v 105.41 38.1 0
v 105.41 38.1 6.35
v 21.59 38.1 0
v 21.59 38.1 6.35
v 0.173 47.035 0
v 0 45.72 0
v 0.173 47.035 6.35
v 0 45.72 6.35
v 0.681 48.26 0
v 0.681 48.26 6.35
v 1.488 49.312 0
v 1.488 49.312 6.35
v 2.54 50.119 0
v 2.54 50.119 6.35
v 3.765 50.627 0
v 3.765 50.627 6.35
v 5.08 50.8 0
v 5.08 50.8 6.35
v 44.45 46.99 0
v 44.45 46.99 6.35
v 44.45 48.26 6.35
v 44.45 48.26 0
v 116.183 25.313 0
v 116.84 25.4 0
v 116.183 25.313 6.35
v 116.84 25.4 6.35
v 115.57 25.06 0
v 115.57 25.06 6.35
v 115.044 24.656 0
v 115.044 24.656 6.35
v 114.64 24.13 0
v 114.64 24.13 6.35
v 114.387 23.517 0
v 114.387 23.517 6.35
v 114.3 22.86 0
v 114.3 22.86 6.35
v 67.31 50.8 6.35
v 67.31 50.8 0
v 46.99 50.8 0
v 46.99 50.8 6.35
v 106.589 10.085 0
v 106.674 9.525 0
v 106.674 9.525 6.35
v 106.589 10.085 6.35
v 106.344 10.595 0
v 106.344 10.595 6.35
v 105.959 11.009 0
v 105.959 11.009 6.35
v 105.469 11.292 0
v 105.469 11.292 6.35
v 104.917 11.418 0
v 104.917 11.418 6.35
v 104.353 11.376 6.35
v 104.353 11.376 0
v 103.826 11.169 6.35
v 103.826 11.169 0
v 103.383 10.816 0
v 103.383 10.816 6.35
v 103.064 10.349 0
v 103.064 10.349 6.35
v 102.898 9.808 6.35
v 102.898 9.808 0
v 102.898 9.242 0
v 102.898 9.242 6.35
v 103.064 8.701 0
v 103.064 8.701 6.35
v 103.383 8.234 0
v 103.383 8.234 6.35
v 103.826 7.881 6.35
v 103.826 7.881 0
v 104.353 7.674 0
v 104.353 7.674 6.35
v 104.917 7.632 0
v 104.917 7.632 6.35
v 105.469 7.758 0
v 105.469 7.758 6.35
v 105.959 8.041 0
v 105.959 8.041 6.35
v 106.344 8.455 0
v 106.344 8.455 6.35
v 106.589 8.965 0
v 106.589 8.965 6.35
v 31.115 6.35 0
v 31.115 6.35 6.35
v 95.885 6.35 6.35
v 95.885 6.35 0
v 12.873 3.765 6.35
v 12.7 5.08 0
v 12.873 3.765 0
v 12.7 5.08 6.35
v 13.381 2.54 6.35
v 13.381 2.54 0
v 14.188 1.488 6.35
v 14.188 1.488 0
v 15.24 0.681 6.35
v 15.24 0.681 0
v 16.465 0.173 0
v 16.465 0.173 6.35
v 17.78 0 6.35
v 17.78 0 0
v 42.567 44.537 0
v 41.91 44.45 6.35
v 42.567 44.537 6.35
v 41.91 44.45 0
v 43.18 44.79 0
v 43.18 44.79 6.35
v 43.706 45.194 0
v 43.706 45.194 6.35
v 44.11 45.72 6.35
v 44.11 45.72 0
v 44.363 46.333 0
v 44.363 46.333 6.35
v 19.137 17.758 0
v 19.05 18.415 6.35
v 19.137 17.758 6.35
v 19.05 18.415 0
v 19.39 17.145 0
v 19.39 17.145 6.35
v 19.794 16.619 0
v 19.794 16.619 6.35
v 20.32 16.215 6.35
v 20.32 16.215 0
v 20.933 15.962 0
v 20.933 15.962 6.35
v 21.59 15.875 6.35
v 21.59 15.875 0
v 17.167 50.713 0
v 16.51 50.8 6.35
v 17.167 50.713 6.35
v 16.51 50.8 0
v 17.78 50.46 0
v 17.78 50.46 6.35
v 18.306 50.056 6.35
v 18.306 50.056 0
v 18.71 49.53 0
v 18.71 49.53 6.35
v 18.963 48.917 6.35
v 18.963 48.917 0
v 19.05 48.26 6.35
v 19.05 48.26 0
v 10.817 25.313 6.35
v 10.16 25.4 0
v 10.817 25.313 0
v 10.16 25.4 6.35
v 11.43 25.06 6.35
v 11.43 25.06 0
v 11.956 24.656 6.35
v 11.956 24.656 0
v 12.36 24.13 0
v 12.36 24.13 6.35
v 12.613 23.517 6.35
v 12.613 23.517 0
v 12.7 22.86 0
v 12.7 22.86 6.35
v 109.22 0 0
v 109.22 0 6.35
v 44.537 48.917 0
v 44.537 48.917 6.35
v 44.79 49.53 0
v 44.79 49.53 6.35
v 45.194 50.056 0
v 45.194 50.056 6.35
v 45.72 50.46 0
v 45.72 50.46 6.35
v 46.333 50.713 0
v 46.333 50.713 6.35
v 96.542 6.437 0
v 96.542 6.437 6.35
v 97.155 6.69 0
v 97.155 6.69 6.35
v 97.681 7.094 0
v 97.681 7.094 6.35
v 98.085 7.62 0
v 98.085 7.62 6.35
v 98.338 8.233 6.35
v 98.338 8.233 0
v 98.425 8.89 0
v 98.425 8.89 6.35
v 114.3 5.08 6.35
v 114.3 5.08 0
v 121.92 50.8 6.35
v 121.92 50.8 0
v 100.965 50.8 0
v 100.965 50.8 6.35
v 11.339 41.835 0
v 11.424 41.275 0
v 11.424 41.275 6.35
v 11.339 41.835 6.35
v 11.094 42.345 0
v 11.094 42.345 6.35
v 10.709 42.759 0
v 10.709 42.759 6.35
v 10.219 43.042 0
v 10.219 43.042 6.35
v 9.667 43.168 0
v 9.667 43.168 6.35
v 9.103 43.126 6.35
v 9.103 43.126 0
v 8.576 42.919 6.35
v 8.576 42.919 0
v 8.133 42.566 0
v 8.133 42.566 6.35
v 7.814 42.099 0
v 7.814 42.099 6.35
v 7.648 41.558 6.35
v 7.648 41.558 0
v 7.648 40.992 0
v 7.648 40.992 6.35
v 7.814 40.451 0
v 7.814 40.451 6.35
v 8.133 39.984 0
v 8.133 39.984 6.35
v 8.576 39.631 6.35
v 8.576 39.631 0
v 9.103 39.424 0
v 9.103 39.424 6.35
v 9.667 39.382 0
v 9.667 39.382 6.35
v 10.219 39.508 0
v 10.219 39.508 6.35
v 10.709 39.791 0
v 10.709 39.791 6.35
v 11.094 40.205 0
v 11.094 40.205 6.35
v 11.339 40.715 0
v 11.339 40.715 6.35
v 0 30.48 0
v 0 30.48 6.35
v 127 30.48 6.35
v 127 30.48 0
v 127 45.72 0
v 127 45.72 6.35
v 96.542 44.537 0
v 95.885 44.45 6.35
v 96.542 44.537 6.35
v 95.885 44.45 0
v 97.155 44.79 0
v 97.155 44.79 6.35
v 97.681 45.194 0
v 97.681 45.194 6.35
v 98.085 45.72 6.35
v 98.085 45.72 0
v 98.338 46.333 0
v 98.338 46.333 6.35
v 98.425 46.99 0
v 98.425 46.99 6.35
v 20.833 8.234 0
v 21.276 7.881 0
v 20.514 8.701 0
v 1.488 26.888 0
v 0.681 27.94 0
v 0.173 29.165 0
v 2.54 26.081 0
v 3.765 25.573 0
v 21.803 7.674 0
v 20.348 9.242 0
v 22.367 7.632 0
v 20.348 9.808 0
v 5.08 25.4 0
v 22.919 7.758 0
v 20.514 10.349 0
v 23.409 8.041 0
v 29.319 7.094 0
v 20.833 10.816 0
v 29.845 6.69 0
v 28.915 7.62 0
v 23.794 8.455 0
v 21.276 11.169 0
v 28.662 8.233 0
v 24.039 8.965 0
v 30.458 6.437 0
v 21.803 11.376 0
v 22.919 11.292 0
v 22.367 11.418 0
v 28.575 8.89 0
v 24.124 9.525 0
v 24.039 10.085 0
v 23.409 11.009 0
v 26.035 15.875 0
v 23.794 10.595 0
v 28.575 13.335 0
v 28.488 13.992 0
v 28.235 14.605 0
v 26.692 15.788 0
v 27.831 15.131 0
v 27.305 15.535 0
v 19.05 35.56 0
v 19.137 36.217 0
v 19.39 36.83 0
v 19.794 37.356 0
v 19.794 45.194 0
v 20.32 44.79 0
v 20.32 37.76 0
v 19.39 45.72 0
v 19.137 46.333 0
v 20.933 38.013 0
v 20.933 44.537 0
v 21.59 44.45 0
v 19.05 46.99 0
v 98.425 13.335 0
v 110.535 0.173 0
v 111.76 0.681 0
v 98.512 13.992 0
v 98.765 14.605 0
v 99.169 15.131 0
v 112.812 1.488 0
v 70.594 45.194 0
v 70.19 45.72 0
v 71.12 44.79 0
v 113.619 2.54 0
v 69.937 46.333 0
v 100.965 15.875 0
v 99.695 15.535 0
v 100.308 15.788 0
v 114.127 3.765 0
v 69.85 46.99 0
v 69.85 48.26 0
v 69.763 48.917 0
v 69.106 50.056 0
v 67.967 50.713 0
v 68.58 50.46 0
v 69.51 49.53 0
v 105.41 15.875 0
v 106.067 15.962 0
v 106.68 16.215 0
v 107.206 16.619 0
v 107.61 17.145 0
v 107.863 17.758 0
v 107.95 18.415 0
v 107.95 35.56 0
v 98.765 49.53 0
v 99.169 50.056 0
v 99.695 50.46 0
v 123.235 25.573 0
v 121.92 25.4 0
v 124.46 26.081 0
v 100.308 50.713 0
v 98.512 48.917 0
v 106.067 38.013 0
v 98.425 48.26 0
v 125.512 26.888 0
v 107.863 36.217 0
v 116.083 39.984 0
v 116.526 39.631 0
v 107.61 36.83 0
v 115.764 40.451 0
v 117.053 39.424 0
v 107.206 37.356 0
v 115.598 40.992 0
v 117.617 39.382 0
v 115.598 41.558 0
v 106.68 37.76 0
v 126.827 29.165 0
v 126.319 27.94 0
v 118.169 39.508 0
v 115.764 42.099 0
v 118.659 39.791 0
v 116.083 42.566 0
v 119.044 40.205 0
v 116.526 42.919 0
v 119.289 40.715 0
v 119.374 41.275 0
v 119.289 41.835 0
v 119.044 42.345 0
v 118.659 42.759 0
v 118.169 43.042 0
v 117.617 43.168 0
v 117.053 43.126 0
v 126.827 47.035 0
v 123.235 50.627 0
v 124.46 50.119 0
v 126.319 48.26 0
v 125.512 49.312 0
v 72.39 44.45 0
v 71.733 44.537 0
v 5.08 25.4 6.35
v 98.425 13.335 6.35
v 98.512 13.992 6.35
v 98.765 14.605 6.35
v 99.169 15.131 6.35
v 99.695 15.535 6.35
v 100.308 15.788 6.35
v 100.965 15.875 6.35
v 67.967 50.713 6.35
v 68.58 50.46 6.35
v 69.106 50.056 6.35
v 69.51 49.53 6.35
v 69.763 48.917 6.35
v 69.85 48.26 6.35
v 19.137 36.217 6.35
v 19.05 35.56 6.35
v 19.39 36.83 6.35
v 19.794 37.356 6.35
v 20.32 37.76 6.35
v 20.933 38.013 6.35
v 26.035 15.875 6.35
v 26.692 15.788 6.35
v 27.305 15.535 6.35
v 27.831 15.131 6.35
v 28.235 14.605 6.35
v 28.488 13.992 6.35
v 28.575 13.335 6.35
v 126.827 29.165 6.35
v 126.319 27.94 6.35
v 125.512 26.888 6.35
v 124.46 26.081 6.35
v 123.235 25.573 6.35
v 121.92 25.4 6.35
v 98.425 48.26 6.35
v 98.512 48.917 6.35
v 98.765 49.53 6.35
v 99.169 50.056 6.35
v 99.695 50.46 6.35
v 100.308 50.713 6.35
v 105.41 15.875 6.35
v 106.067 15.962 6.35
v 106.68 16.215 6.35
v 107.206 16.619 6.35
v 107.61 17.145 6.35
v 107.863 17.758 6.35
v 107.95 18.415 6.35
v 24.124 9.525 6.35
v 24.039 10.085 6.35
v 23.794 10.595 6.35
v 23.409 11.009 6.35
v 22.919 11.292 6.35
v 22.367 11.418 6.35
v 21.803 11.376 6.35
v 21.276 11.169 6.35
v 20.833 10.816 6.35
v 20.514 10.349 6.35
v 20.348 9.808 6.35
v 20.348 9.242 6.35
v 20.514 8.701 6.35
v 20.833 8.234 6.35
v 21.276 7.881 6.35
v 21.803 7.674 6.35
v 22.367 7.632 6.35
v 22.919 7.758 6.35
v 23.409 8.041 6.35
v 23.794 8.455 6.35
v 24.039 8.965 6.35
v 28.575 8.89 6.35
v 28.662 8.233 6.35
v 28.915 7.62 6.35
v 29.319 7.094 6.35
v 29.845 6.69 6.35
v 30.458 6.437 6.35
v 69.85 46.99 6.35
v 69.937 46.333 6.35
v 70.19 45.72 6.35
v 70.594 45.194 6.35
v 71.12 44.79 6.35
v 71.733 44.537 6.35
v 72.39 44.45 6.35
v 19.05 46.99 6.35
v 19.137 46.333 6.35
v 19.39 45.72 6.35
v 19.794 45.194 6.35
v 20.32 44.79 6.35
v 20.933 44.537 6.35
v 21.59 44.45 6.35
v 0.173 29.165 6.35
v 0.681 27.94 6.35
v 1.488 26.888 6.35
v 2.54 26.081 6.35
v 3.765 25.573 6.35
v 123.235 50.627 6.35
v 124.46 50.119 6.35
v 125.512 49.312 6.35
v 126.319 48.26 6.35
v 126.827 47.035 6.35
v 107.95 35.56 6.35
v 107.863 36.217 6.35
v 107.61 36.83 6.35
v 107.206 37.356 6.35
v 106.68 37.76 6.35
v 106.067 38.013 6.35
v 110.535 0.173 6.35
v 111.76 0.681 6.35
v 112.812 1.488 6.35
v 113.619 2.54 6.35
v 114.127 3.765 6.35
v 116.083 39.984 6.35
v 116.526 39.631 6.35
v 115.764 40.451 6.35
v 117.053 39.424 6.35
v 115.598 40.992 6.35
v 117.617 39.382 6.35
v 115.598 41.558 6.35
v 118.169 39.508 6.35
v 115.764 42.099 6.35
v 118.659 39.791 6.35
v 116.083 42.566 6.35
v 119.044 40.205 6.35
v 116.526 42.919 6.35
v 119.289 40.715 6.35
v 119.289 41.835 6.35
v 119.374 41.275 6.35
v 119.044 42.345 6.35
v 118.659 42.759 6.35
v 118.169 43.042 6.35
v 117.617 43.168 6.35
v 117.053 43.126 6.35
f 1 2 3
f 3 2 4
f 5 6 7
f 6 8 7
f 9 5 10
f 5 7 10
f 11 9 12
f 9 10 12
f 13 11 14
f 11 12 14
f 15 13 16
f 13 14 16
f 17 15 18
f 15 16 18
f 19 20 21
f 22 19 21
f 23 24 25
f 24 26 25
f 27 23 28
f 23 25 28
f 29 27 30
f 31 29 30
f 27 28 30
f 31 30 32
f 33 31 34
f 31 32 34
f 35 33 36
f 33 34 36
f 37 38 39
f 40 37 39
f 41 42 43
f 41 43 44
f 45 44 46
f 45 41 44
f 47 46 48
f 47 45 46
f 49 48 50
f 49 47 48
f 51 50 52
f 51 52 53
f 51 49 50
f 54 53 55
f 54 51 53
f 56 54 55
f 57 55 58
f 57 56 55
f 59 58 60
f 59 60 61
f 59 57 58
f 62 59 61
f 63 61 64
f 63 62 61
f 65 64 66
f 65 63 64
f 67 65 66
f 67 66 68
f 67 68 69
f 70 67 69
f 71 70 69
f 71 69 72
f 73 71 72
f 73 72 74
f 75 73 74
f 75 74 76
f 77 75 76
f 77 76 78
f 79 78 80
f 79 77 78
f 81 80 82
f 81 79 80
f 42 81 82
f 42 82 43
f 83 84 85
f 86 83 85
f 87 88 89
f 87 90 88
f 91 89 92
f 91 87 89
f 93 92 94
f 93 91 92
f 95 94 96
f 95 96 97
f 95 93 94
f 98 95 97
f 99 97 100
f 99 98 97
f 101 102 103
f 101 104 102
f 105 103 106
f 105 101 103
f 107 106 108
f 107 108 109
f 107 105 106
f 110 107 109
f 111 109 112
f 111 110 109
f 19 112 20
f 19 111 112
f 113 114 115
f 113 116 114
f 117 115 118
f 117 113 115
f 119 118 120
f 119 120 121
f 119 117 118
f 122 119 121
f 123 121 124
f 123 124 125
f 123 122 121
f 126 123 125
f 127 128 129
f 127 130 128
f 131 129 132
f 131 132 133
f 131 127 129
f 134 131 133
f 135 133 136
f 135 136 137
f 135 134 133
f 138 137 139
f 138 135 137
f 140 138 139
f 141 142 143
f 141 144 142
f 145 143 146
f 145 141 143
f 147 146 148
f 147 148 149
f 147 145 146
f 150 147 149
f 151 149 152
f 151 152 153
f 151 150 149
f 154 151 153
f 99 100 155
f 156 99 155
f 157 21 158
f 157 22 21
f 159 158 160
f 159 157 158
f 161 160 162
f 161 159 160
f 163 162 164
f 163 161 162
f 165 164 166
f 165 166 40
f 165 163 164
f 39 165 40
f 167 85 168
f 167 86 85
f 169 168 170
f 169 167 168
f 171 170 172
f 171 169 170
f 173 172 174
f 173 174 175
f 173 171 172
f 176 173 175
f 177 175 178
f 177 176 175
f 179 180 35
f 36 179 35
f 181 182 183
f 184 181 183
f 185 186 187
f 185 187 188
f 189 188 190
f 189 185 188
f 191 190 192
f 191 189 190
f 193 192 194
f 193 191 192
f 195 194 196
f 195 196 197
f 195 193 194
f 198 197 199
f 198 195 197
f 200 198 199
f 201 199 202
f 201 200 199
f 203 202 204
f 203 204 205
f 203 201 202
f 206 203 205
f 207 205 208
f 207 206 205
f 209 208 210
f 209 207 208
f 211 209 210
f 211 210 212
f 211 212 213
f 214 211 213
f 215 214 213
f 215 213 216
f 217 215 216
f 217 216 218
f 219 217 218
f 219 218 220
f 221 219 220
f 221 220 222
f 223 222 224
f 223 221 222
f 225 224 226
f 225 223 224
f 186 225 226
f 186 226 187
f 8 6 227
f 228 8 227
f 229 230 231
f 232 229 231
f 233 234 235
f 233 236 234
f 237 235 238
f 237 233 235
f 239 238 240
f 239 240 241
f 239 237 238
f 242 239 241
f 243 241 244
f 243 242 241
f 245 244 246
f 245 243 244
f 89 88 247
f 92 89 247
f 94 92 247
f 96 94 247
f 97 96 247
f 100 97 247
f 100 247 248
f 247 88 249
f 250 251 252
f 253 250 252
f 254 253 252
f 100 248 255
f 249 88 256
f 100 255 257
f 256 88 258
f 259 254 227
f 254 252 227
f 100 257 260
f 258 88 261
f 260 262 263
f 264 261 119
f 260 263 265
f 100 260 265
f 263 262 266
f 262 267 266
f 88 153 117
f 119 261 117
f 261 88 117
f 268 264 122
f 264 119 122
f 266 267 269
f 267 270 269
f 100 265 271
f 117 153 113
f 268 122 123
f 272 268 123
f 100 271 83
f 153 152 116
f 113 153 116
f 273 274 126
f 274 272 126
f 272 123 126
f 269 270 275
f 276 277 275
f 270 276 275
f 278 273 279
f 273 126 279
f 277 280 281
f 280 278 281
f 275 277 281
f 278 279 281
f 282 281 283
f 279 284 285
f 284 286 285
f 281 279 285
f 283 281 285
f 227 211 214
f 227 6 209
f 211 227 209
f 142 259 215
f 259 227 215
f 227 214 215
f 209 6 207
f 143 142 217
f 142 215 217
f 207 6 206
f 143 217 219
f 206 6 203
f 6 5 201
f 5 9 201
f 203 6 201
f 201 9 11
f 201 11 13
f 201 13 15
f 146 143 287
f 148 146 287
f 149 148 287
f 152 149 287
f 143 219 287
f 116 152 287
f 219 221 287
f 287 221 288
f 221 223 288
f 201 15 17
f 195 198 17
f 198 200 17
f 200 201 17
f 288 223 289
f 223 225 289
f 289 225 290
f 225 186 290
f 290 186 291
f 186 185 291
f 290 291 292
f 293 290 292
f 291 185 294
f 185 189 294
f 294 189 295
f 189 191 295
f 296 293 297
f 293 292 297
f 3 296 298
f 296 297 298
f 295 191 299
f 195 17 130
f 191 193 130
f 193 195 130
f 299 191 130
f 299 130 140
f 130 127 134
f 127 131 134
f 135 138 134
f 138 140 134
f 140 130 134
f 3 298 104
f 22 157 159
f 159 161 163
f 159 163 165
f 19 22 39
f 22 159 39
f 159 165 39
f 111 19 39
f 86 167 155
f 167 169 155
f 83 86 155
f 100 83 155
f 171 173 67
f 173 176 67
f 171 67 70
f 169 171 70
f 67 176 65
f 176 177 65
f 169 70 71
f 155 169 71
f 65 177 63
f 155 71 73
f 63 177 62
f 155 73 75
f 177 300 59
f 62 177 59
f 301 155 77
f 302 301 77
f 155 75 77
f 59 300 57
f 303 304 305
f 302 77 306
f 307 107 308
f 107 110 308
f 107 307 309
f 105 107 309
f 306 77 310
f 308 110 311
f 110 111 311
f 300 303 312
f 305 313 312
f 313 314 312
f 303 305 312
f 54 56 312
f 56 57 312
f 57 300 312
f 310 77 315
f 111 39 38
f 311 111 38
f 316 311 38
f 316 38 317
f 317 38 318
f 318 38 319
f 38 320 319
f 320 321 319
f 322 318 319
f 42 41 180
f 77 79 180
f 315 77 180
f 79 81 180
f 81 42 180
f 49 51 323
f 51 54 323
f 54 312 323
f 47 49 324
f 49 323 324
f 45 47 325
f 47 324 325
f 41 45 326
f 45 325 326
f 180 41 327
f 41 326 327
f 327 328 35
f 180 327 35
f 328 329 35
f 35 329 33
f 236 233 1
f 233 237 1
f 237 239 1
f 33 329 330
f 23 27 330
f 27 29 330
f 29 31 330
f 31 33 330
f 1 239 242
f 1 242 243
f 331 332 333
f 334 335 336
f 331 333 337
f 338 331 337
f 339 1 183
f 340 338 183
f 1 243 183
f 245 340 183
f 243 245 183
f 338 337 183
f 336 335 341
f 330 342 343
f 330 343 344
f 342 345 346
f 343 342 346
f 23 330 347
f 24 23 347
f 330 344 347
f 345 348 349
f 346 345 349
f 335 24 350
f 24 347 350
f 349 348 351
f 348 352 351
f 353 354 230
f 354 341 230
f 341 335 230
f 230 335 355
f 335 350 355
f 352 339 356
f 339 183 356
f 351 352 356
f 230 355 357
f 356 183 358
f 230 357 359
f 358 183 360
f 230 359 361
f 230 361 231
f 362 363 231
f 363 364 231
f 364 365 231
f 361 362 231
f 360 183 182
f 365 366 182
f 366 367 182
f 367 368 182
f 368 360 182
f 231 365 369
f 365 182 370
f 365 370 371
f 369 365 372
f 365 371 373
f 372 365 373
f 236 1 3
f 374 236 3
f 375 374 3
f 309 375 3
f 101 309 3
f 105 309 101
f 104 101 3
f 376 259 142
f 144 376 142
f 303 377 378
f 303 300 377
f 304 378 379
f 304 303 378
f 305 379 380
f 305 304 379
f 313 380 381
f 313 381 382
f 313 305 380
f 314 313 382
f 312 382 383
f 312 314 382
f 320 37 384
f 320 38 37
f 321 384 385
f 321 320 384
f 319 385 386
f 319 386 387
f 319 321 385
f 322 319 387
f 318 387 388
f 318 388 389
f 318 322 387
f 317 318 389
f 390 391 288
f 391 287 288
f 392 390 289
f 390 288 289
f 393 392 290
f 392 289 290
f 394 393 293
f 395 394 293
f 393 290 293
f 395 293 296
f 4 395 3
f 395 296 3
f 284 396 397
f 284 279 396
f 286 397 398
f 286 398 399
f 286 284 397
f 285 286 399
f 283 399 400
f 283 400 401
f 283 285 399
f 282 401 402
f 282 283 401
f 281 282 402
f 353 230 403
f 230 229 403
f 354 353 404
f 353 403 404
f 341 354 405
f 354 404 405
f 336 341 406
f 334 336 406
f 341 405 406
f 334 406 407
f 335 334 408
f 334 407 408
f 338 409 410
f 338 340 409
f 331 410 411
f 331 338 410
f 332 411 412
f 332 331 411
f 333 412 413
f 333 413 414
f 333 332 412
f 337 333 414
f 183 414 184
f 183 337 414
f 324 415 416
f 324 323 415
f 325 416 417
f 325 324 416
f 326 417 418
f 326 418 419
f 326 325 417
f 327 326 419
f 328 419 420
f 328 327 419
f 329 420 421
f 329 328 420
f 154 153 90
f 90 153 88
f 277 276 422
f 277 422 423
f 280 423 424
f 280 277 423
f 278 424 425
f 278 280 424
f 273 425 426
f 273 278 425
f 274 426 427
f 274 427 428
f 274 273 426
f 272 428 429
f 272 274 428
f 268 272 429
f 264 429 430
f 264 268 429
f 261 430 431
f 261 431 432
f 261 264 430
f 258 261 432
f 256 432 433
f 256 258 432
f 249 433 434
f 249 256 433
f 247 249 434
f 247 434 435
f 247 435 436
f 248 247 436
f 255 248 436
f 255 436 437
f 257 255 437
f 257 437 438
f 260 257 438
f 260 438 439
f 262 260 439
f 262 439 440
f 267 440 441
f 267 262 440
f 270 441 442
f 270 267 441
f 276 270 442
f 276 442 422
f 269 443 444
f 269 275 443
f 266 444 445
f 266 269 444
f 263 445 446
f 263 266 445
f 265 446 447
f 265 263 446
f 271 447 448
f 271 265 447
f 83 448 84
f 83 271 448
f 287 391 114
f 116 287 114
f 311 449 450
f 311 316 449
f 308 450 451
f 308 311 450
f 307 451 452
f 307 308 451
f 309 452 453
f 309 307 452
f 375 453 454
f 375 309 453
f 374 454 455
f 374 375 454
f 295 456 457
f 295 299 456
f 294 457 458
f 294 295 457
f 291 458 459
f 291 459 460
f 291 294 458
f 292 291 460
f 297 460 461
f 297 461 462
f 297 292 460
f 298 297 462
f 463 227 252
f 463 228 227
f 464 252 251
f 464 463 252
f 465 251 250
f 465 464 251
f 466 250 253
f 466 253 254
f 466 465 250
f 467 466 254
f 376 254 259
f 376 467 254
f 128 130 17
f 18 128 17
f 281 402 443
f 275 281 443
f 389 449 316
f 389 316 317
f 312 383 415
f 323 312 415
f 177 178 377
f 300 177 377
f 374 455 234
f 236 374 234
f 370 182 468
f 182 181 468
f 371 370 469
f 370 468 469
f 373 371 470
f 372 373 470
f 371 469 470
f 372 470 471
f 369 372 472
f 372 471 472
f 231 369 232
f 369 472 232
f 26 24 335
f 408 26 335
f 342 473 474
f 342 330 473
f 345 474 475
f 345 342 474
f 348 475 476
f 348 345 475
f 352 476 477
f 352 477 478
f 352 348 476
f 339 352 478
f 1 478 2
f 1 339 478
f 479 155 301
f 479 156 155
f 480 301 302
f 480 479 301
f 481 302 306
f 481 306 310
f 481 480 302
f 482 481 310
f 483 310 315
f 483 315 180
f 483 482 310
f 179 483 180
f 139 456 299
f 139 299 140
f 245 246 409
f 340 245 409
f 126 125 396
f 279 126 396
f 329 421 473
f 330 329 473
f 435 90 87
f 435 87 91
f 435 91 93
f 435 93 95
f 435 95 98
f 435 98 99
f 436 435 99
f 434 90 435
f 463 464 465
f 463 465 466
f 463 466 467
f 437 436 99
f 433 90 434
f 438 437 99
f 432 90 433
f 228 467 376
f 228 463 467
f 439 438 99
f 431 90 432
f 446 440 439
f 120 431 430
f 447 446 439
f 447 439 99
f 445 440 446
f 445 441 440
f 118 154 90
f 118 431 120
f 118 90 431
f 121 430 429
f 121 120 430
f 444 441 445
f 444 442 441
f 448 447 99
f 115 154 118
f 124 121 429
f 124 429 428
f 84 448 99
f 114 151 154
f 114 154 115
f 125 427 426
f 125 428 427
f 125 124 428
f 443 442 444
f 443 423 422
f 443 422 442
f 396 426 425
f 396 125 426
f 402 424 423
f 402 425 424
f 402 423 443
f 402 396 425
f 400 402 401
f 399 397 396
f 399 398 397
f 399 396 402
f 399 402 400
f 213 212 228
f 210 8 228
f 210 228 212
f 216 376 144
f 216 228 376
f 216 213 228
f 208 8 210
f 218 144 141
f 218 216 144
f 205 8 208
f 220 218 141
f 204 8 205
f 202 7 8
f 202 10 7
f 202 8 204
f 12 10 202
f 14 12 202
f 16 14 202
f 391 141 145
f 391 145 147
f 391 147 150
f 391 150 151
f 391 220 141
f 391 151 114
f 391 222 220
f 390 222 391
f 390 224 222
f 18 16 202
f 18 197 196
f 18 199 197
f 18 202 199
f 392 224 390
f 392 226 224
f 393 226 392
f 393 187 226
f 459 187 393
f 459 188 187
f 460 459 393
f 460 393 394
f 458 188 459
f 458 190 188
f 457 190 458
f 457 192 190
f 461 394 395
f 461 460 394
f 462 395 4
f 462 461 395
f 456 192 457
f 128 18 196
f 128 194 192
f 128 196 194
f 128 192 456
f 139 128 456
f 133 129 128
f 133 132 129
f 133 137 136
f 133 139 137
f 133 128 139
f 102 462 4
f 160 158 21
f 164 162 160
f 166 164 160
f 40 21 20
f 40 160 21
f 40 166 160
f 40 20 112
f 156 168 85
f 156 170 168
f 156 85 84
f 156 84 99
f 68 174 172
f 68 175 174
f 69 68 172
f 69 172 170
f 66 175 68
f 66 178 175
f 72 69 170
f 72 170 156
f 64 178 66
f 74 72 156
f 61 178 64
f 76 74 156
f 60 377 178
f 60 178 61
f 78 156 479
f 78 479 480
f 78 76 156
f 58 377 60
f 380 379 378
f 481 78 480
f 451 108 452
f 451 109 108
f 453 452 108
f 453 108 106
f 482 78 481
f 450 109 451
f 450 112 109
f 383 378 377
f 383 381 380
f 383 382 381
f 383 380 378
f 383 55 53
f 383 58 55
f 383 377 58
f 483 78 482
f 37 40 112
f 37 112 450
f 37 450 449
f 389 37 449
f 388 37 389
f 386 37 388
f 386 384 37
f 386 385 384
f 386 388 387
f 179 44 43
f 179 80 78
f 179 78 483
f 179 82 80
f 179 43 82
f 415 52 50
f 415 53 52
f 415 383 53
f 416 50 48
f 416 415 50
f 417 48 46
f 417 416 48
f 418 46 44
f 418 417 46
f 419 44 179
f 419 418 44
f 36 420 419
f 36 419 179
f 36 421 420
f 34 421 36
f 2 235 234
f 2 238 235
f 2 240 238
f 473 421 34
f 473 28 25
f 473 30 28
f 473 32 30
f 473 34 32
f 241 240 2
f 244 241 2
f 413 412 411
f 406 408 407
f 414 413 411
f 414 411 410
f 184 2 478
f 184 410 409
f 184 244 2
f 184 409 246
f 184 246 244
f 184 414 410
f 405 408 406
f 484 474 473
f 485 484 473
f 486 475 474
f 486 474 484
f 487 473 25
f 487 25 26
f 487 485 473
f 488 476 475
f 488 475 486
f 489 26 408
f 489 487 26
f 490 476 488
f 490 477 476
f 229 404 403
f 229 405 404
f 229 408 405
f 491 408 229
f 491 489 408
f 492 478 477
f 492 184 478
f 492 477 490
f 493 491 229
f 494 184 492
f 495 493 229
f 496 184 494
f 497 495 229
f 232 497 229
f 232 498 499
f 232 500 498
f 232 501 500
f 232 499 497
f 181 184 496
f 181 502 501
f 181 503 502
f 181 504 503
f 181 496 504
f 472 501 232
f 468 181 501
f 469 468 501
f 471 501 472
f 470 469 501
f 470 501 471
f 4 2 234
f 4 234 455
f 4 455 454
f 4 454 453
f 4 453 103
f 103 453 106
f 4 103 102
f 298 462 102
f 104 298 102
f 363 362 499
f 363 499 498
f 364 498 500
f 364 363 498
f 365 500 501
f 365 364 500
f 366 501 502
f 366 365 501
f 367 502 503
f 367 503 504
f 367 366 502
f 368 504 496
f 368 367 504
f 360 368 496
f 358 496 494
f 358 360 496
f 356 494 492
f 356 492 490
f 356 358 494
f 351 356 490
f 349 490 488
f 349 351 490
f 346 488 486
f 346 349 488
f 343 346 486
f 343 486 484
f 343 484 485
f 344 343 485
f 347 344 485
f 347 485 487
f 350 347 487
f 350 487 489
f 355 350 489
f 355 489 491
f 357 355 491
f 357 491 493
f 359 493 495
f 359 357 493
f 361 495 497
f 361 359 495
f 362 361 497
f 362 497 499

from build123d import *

# Parameters (mm, degrees)
SKETCH1_R           = 1.89865
SKETCH1_R_2         = 1.5875
BOSS_EXTRUDE1_DEPTH = 6.35
FILLET1_R           = 5.08
FILLET2_R           = 2.54
SKETCH2_W           = 25.4
SKETCH2_H           = 6.35
SKETCH2_W_2         = 28.575
CUT_EXTRUDE1_DEPTH  = 8.89
FILLET3_R           = 2.54


with BuildPart() as part:
    # Sketch1 → Boss-Extrude1 (new body)
    with BuildSketch(Plane.XY):
        Polygon((0, 50.8), (0, 25.4), (12.7, 25.4), (12.7, 0), (114.3, 0), (114.3, 25.4), (127, 25.4), (127, 50.8), align=None)
        with Locations((22.225, 9.525)):
            Circle(SKETCH1_R, mode=Mode.SUBTRACT)
        with Locations((52.324, 19.558)):
            Circle(SKETCH1_R_2, mode=Mode.SUBTRACT)
        with Locations((104.775, 9.525)):
            Circle(SKETCH1_R, mode=Mode.SUBTRACT)
        with Locations((52.324, 30.734)):
            Circle(SKETCH1_R_2, mode=Mode.SUBTRACT)
        with Locations((9.525, 41.275)):
            Circle(SKETCH1_R, mode=Mode.SUBTRACT)
        with Locations((23.622, 47.625)):
            Circle(SKETCH1_R_2, mode=Mode.SUBTRACT)
        with Locations((38.1, 47.625)):
            Circle(SKETCH1_R_2, mode=Mode.SUBTRACT)
        with Locations((78.74, 47.625)):
            Circle(SKETCH1_R_2, mode=Mode.SUBTRACT)
        with Locations((89.662, 47.625)):
            Circle(SKETCH1_R_2, mode=Mode.SUBTRACT)
        with Locations((117.475, 41.275)):
            Circle(SKETCH1_R, mode=Mode.SUBTRACT)
    extrude(amount=BOSS_EXTRUDE1_DEPTH)

    # Fillet1
    fillet1_edges = [part.edges().sort_by_distance(p)[0] for p in [
        (114.3, 0, 3.175),
        (12.7, 0, 3.175),
        (0, 25.4, 3.175),
        (0, 50.8, 3.175),
        (127, 50.8, 3.175),
        (127, 25.4, 3.175),
    ]]
    fillet(fillet1_edges, radius=FILLET1_R)

    # Fillet2
    fillet2_edges = [part.edges().sort_by_distance(p)[0] for p in [
        (12.7, 25.4, 3.175),
        (114.3, 25.4, 3.175),
    ]]
    fillet(fillet2_edges, radius=FILLET2_R)

    # Sketch2 → Cut-Extrude1 (cut)
    with BuildSketch(Plane.XY.offset(6.35)):
        with Locations((31.75, 47.625)):
            Rectangle(SKETCH2_W, SKETCH2_H)
        with Locations((84.1375, 47.625)):
            Rectangle(SKETCH2_W_2, SKETCH2_H)
        Polygon((19.05, 38.1), (19.05, 15.875), (28.575, 15.875), (28.575, 6.35), (98.425, 6.35), (98.425, 15.875), (107.95, 15.875), (107.95, 38.1), align=None)
    extrude(amount=-CUT_EXTRUDE1_DEPTH, mode=Mode.SUBTRACT)

    # Fillet3
    fillet3_edges = [part.edges().sort_by_distance(p)[0] for p in [
        (19.05, 50.8, 3.175),
        (44.45, 50.8, 3.175),
        (44.45, 44.45, 3.175),
        (19.05, 44.45, 3.175),
        (69.85, 50.8, 3.175),
        (98.425, 50.8, 3.175),
        (98.425, 44.45, 3.175),
        (69.85, 44.45, 3.175),
        (19.05, 38.1, 3.175),
        (107.95, 38.1, 3.175),
        (107.95, 15.875, 3.175),
        (98.425, 15.875, 3.175),
        (98.425, 6.35, 3.175),
        (28.575, 6.35, 3.175),
        (28.575, 15.875, 3.175),
        (19.05, 15.875, 3.175),
    ]]
    fillet(fillet3_edges, radius=FILLET3_R)


solid = part.part
